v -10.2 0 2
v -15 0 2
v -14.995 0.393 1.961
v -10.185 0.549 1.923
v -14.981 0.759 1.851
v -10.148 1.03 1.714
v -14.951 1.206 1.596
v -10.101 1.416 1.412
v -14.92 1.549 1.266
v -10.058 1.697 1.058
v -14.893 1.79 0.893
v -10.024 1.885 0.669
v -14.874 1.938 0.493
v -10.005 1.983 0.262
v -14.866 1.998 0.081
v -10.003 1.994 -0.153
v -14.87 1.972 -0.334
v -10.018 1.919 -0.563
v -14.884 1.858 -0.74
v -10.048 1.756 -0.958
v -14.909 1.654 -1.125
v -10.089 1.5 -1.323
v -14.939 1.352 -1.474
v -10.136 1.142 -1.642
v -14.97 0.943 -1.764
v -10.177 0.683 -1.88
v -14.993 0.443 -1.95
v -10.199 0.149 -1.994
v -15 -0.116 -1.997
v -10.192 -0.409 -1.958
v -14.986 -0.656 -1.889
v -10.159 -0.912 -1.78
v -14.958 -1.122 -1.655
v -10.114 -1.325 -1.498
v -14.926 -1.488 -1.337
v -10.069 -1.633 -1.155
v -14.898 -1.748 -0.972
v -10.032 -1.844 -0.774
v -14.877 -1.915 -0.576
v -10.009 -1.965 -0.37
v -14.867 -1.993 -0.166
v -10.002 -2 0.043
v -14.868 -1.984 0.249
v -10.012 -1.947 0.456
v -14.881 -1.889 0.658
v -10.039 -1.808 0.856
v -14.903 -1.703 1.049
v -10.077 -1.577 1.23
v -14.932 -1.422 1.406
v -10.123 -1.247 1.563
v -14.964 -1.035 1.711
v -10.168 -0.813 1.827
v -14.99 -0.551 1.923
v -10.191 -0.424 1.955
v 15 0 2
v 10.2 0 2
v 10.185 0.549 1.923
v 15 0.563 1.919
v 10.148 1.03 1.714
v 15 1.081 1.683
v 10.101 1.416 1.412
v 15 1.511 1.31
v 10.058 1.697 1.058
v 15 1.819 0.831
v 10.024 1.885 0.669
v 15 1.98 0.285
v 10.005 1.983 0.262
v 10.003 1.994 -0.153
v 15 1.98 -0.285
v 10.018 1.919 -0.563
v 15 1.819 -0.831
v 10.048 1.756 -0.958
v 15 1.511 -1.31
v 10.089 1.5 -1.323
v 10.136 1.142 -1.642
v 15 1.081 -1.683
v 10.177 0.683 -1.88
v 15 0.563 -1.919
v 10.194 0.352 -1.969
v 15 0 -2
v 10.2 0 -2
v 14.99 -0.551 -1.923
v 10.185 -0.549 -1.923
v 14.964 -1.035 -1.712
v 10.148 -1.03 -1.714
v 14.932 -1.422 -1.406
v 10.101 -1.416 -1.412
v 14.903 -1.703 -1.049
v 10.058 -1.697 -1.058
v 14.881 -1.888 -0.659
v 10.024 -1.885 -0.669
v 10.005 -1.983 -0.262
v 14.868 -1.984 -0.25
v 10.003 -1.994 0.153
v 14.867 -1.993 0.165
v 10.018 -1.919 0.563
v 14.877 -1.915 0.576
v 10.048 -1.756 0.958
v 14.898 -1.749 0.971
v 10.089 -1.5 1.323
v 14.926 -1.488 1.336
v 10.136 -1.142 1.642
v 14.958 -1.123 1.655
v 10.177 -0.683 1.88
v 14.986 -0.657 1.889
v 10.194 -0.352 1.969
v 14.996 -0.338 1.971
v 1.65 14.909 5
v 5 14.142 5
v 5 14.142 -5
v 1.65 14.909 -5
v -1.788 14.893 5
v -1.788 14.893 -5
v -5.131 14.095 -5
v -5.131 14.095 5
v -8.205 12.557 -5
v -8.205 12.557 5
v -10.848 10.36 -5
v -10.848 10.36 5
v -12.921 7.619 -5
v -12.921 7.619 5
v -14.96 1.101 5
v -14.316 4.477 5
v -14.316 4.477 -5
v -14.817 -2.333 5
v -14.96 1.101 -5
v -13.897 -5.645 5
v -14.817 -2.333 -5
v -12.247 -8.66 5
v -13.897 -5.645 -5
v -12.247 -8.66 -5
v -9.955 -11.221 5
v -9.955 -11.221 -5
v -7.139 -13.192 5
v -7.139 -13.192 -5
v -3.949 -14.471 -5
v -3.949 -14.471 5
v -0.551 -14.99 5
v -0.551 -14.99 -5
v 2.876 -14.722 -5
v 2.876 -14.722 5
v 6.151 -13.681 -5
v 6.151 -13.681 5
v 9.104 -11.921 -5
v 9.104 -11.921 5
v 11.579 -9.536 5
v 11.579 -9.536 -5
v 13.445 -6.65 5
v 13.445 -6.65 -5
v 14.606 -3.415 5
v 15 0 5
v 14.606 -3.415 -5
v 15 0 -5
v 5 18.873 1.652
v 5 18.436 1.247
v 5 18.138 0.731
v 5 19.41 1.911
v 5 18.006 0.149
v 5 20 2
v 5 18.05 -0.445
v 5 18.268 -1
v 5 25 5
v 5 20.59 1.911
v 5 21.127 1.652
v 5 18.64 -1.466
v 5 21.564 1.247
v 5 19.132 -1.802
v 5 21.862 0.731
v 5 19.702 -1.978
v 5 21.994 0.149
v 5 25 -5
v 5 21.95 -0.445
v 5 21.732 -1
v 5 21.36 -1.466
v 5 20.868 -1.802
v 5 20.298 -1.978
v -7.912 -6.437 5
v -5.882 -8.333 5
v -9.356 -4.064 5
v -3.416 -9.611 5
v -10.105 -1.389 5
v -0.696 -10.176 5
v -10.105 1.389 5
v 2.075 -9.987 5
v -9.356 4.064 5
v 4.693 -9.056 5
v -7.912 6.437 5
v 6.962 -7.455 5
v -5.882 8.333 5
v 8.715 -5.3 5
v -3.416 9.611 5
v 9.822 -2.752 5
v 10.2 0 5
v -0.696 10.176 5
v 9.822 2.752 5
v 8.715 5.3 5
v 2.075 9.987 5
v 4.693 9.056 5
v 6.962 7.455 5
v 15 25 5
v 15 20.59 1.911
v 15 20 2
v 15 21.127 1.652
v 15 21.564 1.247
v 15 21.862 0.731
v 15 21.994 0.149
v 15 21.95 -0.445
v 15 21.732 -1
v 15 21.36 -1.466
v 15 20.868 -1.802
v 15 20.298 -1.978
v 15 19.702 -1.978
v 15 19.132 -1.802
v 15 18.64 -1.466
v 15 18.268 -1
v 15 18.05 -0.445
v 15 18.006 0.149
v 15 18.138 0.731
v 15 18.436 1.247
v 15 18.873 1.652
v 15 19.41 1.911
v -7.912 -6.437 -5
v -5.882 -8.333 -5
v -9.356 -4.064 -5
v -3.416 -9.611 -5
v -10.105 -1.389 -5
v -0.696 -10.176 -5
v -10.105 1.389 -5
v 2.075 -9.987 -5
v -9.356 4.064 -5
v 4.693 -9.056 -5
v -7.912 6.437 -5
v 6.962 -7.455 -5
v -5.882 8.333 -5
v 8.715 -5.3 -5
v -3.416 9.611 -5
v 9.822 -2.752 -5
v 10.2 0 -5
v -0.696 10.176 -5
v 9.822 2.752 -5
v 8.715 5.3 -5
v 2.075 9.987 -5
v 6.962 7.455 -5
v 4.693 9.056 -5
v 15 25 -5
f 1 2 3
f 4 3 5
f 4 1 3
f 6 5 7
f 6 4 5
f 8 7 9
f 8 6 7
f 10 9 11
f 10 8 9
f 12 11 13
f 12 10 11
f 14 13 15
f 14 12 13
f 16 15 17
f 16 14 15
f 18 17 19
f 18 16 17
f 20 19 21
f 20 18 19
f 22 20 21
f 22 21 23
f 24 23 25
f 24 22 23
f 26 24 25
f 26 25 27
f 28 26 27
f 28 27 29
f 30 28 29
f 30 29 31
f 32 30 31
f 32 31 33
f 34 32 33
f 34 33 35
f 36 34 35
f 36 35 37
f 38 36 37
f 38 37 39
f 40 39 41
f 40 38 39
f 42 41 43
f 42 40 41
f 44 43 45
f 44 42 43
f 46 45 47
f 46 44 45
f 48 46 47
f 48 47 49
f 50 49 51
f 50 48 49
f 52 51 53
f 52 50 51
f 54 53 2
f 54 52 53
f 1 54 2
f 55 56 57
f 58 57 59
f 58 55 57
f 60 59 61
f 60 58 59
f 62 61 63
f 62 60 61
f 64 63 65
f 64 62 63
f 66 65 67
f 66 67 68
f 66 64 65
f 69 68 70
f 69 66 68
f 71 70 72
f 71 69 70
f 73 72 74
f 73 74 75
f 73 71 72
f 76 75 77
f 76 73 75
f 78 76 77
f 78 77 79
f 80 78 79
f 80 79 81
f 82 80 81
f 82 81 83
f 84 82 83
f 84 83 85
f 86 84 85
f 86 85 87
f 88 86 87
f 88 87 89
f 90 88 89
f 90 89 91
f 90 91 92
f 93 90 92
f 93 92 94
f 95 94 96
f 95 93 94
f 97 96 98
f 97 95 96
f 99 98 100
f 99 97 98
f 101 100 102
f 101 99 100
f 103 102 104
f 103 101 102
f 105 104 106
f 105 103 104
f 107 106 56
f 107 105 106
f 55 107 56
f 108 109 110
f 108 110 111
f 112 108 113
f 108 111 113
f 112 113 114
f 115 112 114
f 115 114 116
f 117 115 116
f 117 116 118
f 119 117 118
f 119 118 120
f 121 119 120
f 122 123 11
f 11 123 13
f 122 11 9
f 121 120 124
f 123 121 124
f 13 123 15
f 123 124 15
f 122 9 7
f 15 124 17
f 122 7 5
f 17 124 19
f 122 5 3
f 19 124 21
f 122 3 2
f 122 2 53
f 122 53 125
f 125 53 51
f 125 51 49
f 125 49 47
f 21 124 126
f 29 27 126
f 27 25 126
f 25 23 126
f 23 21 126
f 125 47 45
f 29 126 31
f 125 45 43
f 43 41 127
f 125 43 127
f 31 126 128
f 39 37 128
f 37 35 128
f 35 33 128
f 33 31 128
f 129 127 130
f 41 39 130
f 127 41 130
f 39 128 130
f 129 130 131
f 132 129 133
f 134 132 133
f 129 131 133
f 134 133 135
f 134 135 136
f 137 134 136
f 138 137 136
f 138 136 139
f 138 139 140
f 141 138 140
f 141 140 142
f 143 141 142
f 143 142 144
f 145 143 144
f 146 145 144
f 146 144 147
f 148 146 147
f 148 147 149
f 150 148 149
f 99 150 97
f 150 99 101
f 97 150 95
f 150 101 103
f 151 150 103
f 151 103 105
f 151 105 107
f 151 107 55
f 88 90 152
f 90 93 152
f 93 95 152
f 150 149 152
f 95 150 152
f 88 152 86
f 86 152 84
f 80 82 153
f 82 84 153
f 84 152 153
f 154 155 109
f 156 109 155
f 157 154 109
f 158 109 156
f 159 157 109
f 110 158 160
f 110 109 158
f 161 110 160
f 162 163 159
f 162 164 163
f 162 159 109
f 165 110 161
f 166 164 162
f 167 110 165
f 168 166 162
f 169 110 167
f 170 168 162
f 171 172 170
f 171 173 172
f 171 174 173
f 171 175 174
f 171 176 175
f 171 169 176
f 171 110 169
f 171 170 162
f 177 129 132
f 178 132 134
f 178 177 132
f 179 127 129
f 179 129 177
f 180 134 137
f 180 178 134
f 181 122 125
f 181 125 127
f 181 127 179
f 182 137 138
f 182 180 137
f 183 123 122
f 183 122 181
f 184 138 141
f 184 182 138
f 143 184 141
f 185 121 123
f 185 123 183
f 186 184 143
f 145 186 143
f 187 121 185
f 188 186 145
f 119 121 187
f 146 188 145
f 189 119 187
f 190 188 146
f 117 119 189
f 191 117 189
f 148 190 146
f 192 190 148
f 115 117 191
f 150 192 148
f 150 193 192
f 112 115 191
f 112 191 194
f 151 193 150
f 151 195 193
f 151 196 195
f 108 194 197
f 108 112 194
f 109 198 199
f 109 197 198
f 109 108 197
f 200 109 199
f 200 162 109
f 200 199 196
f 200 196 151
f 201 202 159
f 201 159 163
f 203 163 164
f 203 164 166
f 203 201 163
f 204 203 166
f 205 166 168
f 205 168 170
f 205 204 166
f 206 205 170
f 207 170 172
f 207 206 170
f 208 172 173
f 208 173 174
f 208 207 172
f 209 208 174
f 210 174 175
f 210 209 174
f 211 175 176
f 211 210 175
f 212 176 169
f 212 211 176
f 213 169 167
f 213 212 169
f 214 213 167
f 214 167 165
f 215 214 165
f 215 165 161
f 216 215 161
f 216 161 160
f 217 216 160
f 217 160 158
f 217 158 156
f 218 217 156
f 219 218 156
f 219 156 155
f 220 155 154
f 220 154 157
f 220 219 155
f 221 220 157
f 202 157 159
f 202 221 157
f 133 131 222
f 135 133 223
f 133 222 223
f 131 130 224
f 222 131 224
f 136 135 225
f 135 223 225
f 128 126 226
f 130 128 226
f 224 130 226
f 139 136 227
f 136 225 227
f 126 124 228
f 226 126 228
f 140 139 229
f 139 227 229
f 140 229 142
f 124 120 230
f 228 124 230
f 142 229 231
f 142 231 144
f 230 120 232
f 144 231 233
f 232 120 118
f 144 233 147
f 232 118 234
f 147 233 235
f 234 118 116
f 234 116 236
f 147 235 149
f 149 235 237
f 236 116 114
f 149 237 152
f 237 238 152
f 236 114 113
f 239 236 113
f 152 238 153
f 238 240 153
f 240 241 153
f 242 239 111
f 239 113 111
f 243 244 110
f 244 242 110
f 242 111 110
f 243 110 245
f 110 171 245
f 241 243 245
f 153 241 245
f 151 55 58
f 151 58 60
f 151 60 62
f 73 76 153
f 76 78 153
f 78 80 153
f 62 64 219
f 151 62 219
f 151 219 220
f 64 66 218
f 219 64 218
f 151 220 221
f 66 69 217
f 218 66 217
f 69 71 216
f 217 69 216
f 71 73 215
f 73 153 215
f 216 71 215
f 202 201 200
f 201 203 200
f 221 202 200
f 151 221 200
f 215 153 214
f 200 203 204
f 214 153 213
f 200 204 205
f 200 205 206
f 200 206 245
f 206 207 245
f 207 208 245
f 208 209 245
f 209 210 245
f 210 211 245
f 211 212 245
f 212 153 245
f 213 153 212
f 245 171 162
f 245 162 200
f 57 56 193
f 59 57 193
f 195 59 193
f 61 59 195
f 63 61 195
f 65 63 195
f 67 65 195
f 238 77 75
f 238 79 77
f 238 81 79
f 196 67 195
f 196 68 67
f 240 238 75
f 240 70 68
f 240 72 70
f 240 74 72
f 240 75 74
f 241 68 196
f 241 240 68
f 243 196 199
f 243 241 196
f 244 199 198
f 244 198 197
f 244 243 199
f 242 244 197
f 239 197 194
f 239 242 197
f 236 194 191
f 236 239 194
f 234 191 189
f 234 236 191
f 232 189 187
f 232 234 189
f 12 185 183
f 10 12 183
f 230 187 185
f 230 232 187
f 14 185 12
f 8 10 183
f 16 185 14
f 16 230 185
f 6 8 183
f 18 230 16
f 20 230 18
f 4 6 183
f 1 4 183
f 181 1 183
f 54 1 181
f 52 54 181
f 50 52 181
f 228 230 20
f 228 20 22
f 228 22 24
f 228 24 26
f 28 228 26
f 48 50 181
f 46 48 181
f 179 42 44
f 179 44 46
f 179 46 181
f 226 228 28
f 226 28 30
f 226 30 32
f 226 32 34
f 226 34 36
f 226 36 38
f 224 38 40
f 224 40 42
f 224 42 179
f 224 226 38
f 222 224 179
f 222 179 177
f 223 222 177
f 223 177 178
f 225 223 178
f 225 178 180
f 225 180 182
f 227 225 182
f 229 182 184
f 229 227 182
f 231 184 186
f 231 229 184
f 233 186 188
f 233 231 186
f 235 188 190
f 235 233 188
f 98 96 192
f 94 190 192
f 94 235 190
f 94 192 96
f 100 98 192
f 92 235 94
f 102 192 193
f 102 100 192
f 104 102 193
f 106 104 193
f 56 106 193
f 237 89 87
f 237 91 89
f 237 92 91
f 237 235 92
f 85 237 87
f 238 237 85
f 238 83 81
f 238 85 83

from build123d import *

# Parameters (mm, degrees)
CYLINDER003_R     = 2
CYLINDER003_DEPTH = 10
CYLINDER004_R     = 2
CYLINDER004_DEPTH = 30
CYLINDER001_R     = 10.2
CYLINDER001_DEPTH = 10
BOX_W             = 10
BOX_H             = 25
BOX_DEPTH         = 10
CYLINDER_R        = 15
CYLINDER_DEPTH    = 10


with BuildPart() as cylinder003:
    # Cylinder003 → Cylinder003 (new body)
    with BuildSketch(Plane(origin=(15, 20, 0), x_dir=(0, 0, 1), z_dir=(-1, 0, 0))):
        Circle(CYLINDER003_R)
    extrude(amount=CYLINDER003_DEPTH)


with BuildPart() as cylinder004:
    # Cylinder004 → Cylinder004 (new body)
    with BuildSketch(Plane.ZY.offset(-15)):
        Circle(CYLINDER004_R)
    extrude(amount=CYLINDER004_DEPTH)


with BuildPart() as negative_fusion:
    # Cylinder001 → Cylinder001 (new body)
    with BuildSketch(Plane.XY.offset(-5)):
        Circle(CYLINDER001_R)
    extrude(amount=CYLINDER001_DEPTH)

    # Fusion: union Cylinder003, Cylinder004
    add(cylinder003.part)
    add(cylinder004.part)


with BuildPart() as cube:
    # Box → Box (new body)
    with BuildSketch(Plane(origin=(5, 0, -5), x_dir=(1, 0, 0), z_dir=(0, 0, 1))):
        with Locations((5, 12.5)):
            Rectangle(BOX_W, BOX_H)
    extrude(amount=BOX_DEPTH)


with BuildPart() as cut:
    # Cylinder → Cylinder (new body)
    with BuildSketch(Plane.XY.offset(-5)):
        Circle(CYLINDER_R)
    extrude(amount=CYLINDER_DEPTH)

    # Fusion001: union Cube
    add(cube.part)

    # Cut: cut Negative Fusion
    add(negative_fusion.part, mode=Mode.SUBTRACT)


solid = cut.part
